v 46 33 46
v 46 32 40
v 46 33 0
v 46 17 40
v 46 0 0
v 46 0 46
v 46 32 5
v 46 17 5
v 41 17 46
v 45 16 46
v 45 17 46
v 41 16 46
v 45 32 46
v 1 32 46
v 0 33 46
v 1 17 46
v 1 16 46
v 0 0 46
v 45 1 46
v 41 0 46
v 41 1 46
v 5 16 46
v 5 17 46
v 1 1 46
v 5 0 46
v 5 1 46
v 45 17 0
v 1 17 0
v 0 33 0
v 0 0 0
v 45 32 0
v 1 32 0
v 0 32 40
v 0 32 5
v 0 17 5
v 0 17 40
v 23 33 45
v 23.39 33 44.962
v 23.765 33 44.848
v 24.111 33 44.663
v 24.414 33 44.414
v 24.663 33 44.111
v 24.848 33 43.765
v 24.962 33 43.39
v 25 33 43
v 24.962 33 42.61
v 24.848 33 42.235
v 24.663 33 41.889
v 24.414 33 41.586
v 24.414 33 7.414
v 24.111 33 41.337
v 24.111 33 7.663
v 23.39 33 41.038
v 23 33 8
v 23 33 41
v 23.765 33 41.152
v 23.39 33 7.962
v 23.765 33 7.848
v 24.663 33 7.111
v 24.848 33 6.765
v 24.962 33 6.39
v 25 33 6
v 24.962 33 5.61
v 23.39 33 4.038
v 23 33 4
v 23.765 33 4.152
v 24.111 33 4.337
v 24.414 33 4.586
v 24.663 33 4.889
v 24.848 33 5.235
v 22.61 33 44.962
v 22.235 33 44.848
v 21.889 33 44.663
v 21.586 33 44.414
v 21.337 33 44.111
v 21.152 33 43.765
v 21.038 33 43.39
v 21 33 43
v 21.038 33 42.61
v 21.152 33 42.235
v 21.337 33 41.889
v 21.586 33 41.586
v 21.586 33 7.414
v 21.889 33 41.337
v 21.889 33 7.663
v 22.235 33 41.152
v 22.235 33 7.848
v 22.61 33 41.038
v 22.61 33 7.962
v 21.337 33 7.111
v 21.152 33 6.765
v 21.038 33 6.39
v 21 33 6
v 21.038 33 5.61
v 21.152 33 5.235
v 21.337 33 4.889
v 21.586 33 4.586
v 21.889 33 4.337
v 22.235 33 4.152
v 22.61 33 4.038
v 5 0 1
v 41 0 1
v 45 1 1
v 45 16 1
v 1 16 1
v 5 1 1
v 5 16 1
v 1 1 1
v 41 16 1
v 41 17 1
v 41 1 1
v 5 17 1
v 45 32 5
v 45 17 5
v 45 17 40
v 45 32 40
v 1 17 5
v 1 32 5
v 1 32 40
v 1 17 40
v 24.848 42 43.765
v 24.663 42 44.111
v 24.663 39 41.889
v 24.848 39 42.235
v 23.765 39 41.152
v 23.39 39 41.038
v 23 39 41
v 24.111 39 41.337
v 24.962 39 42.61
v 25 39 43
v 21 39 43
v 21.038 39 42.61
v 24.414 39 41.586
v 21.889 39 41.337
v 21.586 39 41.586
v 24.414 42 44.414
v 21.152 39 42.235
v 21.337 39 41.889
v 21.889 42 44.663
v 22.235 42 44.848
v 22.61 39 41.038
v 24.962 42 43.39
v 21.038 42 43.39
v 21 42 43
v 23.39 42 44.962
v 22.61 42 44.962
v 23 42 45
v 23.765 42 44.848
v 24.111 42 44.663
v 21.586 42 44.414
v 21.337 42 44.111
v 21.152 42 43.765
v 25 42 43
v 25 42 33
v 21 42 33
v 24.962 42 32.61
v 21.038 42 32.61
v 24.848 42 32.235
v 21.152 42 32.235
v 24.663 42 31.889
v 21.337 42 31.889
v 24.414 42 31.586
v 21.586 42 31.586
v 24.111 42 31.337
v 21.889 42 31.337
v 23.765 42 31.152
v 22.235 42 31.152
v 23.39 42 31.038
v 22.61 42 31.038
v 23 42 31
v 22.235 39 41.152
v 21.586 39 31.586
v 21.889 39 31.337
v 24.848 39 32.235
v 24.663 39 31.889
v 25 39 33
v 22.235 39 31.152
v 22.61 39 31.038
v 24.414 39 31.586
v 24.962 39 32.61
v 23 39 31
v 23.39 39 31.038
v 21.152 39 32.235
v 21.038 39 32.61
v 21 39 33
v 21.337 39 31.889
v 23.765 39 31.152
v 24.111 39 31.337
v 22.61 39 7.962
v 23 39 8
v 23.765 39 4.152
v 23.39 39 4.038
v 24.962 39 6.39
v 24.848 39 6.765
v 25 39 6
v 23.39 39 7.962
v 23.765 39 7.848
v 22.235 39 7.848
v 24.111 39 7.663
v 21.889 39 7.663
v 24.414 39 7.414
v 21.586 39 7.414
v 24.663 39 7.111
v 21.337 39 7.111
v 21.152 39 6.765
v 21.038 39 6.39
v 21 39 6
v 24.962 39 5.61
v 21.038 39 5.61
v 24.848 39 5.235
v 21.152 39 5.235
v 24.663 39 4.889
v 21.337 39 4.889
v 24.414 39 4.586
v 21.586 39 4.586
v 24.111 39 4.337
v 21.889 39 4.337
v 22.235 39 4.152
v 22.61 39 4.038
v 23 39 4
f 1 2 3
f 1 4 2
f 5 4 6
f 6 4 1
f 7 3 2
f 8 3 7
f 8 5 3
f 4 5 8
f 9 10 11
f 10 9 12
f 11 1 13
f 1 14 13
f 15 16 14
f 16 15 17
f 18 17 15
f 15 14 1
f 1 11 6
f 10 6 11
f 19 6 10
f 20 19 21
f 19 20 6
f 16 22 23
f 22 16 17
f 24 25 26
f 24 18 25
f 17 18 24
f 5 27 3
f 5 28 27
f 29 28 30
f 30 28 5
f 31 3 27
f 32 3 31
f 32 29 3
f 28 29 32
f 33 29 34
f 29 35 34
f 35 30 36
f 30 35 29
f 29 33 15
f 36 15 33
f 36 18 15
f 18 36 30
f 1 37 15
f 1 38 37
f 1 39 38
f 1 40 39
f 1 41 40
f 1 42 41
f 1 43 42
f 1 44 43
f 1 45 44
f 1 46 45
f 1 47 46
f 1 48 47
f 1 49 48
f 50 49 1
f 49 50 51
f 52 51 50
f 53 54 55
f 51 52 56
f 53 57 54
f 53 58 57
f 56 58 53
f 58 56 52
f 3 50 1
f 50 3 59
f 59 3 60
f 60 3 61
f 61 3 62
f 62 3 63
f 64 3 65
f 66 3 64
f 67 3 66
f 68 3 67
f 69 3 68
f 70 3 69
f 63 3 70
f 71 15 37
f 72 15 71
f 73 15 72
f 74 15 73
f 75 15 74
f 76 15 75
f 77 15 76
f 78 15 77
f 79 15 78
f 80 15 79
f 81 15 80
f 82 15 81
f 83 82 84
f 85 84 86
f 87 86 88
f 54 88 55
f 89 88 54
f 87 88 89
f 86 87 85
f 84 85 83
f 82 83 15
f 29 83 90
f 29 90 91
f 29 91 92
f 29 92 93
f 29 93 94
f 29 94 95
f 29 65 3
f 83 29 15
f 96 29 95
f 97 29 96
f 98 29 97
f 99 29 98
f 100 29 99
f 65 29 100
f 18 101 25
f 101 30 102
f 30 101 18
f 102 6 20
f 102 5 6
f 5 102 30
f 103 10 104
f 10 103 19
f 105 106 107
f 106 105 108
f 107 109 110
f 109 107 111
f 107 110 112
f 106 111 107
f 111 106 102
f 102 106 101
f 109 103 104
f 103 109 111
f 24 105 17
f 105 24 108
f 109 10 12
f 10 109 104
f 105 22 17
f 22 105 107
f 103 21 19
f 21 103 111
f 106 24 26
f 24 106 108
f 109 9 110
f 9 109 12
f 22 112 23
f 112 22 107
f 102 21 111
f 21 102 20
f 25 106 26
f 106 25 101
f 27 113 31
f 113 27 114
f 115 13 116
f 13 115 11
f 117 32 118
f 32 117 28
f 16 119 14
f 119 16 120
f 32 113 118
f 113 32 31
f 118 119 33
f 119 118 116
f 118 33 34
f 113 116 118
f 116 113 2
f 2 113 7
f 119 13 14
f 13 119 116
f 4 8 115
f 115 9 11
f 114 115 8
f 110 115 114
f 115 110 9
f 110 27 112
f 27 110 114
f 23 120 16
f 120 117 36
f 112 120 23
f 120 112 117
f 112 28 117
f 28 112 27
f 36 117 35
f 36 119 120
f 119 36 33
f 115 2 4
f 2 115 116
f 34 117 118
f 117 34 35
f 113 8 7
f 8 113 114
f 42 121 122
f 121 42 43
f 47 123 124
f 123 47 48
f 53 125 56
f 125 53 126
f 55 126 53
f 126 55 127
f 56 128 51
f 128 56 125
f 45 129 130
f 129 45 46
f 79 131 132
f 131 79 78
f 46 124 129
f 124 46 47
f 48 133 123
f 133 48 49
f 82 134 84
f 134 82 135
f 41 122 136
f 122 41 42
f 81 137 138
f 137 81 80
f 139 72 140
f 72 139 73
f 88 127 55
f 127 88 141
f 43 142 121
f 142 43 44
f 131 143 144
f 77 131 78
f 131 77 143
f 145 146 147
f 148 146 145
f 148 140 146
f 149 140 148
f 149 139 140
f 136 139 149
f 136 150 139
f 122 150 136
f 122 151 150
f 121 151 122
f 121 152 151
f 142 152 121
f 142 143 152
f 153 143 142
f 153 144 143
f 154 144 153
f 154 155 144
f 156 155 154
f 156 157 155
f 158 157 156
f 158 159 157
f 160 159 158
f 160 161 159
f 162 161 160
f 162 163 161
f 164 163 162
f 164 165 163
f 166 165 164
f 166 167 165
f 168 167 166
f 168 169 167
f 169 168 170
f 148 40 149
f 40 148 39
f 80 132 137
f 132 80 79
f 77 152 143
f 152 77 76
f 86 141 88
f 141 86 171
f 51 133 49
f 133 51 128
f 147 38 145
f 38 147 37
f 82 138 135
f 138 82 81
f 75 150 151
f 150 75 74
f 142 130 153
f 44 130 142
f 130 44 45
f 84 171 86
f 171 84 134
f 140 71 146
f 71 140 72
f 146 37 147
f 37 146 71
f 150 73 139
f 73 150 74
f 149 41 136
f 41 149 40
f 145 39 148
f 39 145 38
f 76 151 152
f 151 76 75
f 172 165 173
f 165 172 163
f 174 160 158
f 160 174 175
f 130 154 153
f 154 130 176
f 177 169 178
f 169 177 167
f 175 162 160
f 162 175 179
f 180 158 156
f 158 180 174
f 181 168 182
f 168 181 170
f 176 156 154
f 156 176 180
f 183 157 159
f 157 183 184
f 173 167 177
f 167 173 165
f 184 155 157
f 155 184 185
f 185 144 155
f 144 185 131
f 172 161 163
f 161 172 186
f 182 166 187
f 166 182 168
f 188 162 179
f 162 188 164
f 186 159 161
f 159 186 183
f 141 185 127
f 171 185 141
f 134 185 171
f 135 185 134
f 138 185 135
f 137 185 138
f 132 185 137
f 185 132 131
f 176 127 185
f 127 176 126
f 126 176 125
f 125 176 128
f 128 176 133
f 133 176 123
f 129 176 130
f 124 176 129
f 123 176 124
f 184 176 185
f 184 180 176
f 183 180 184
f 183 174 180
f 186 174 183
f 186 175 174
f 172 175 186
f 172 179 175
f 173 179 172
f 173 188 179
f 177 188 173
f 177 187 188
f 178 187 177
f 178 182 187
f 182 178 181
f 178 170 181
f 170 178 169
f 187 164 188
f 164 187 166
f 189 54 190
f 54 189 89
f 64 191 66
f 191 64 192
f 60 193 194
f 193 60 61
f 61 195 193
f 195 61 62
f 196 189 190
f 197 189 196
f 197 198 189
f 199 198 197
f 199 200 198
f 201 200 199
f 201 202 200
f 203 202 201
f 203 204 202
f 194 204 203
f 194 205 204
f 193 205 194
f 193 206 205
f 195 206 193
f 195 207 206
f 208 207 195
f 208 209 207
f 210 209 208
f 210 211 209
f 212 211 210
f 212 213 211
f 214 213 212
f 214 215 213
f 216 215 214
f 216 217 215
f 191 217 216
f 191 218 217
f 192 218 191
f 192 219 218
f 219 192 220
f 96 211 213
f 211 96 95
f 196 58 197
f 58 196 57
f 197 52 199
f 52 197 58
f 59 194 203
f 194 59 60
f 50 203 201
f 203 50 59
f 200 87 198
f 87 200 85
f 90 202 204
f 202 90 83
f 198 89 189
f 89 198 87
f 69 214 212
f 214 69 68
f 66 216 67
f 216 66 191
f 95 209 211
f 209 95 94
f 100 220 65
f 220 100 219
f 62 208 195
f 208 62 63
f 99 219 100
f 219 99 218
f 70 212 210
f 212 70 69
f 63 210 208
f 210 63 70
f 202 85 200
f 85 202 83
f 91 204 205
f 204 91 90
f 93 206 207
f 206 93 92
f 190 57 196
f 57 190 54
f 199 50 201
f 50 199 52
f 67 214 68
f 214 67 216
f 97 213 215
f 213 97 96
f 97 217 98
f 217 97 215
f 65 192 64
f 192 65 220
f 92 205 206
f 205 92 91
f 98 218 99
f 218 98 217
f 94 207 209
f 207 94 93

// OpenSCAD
// file: gancho.scad
module ganchos(n=1){    
    for (i=[0:1:n-1]){
        translate([0,40*i,,0]) rotate([0, 90, 0]) translate([0, 0, -9]) {
            cylinder(d = 4, h=9, $fn = 32);
            hull(){
                cylinder(d = 4, h=3, $fn = 32);
                translate([10, 0, 0]) cylinder(d = 4, h=3, $fn = 32);
            } 
        }
    }   
}

// ganchos(3);
// main file
include <gancho.scad>

module caja(){
    difference(){
        cube([46,33,46]);
        translate([1,1,1]) cube([44,15,46]);
        translate([5,3,1]) cube([36,15,46]);
        translate([5,-3,1]) cube([36,15,46]);
        translate([1,17,-1]) cube([44,15,50]);
        translate([-5,17,5]) cube([54,15,35]);
    }
    translate([46/2,33,46 - 3]) rotate([0,0,-90]) ganchos(1);
    translate([46/2,36,46- 40]) rotate([90,0,0]) cylinder(d = 4, h= 6, center = true, $fn = 32);
}

caja();
